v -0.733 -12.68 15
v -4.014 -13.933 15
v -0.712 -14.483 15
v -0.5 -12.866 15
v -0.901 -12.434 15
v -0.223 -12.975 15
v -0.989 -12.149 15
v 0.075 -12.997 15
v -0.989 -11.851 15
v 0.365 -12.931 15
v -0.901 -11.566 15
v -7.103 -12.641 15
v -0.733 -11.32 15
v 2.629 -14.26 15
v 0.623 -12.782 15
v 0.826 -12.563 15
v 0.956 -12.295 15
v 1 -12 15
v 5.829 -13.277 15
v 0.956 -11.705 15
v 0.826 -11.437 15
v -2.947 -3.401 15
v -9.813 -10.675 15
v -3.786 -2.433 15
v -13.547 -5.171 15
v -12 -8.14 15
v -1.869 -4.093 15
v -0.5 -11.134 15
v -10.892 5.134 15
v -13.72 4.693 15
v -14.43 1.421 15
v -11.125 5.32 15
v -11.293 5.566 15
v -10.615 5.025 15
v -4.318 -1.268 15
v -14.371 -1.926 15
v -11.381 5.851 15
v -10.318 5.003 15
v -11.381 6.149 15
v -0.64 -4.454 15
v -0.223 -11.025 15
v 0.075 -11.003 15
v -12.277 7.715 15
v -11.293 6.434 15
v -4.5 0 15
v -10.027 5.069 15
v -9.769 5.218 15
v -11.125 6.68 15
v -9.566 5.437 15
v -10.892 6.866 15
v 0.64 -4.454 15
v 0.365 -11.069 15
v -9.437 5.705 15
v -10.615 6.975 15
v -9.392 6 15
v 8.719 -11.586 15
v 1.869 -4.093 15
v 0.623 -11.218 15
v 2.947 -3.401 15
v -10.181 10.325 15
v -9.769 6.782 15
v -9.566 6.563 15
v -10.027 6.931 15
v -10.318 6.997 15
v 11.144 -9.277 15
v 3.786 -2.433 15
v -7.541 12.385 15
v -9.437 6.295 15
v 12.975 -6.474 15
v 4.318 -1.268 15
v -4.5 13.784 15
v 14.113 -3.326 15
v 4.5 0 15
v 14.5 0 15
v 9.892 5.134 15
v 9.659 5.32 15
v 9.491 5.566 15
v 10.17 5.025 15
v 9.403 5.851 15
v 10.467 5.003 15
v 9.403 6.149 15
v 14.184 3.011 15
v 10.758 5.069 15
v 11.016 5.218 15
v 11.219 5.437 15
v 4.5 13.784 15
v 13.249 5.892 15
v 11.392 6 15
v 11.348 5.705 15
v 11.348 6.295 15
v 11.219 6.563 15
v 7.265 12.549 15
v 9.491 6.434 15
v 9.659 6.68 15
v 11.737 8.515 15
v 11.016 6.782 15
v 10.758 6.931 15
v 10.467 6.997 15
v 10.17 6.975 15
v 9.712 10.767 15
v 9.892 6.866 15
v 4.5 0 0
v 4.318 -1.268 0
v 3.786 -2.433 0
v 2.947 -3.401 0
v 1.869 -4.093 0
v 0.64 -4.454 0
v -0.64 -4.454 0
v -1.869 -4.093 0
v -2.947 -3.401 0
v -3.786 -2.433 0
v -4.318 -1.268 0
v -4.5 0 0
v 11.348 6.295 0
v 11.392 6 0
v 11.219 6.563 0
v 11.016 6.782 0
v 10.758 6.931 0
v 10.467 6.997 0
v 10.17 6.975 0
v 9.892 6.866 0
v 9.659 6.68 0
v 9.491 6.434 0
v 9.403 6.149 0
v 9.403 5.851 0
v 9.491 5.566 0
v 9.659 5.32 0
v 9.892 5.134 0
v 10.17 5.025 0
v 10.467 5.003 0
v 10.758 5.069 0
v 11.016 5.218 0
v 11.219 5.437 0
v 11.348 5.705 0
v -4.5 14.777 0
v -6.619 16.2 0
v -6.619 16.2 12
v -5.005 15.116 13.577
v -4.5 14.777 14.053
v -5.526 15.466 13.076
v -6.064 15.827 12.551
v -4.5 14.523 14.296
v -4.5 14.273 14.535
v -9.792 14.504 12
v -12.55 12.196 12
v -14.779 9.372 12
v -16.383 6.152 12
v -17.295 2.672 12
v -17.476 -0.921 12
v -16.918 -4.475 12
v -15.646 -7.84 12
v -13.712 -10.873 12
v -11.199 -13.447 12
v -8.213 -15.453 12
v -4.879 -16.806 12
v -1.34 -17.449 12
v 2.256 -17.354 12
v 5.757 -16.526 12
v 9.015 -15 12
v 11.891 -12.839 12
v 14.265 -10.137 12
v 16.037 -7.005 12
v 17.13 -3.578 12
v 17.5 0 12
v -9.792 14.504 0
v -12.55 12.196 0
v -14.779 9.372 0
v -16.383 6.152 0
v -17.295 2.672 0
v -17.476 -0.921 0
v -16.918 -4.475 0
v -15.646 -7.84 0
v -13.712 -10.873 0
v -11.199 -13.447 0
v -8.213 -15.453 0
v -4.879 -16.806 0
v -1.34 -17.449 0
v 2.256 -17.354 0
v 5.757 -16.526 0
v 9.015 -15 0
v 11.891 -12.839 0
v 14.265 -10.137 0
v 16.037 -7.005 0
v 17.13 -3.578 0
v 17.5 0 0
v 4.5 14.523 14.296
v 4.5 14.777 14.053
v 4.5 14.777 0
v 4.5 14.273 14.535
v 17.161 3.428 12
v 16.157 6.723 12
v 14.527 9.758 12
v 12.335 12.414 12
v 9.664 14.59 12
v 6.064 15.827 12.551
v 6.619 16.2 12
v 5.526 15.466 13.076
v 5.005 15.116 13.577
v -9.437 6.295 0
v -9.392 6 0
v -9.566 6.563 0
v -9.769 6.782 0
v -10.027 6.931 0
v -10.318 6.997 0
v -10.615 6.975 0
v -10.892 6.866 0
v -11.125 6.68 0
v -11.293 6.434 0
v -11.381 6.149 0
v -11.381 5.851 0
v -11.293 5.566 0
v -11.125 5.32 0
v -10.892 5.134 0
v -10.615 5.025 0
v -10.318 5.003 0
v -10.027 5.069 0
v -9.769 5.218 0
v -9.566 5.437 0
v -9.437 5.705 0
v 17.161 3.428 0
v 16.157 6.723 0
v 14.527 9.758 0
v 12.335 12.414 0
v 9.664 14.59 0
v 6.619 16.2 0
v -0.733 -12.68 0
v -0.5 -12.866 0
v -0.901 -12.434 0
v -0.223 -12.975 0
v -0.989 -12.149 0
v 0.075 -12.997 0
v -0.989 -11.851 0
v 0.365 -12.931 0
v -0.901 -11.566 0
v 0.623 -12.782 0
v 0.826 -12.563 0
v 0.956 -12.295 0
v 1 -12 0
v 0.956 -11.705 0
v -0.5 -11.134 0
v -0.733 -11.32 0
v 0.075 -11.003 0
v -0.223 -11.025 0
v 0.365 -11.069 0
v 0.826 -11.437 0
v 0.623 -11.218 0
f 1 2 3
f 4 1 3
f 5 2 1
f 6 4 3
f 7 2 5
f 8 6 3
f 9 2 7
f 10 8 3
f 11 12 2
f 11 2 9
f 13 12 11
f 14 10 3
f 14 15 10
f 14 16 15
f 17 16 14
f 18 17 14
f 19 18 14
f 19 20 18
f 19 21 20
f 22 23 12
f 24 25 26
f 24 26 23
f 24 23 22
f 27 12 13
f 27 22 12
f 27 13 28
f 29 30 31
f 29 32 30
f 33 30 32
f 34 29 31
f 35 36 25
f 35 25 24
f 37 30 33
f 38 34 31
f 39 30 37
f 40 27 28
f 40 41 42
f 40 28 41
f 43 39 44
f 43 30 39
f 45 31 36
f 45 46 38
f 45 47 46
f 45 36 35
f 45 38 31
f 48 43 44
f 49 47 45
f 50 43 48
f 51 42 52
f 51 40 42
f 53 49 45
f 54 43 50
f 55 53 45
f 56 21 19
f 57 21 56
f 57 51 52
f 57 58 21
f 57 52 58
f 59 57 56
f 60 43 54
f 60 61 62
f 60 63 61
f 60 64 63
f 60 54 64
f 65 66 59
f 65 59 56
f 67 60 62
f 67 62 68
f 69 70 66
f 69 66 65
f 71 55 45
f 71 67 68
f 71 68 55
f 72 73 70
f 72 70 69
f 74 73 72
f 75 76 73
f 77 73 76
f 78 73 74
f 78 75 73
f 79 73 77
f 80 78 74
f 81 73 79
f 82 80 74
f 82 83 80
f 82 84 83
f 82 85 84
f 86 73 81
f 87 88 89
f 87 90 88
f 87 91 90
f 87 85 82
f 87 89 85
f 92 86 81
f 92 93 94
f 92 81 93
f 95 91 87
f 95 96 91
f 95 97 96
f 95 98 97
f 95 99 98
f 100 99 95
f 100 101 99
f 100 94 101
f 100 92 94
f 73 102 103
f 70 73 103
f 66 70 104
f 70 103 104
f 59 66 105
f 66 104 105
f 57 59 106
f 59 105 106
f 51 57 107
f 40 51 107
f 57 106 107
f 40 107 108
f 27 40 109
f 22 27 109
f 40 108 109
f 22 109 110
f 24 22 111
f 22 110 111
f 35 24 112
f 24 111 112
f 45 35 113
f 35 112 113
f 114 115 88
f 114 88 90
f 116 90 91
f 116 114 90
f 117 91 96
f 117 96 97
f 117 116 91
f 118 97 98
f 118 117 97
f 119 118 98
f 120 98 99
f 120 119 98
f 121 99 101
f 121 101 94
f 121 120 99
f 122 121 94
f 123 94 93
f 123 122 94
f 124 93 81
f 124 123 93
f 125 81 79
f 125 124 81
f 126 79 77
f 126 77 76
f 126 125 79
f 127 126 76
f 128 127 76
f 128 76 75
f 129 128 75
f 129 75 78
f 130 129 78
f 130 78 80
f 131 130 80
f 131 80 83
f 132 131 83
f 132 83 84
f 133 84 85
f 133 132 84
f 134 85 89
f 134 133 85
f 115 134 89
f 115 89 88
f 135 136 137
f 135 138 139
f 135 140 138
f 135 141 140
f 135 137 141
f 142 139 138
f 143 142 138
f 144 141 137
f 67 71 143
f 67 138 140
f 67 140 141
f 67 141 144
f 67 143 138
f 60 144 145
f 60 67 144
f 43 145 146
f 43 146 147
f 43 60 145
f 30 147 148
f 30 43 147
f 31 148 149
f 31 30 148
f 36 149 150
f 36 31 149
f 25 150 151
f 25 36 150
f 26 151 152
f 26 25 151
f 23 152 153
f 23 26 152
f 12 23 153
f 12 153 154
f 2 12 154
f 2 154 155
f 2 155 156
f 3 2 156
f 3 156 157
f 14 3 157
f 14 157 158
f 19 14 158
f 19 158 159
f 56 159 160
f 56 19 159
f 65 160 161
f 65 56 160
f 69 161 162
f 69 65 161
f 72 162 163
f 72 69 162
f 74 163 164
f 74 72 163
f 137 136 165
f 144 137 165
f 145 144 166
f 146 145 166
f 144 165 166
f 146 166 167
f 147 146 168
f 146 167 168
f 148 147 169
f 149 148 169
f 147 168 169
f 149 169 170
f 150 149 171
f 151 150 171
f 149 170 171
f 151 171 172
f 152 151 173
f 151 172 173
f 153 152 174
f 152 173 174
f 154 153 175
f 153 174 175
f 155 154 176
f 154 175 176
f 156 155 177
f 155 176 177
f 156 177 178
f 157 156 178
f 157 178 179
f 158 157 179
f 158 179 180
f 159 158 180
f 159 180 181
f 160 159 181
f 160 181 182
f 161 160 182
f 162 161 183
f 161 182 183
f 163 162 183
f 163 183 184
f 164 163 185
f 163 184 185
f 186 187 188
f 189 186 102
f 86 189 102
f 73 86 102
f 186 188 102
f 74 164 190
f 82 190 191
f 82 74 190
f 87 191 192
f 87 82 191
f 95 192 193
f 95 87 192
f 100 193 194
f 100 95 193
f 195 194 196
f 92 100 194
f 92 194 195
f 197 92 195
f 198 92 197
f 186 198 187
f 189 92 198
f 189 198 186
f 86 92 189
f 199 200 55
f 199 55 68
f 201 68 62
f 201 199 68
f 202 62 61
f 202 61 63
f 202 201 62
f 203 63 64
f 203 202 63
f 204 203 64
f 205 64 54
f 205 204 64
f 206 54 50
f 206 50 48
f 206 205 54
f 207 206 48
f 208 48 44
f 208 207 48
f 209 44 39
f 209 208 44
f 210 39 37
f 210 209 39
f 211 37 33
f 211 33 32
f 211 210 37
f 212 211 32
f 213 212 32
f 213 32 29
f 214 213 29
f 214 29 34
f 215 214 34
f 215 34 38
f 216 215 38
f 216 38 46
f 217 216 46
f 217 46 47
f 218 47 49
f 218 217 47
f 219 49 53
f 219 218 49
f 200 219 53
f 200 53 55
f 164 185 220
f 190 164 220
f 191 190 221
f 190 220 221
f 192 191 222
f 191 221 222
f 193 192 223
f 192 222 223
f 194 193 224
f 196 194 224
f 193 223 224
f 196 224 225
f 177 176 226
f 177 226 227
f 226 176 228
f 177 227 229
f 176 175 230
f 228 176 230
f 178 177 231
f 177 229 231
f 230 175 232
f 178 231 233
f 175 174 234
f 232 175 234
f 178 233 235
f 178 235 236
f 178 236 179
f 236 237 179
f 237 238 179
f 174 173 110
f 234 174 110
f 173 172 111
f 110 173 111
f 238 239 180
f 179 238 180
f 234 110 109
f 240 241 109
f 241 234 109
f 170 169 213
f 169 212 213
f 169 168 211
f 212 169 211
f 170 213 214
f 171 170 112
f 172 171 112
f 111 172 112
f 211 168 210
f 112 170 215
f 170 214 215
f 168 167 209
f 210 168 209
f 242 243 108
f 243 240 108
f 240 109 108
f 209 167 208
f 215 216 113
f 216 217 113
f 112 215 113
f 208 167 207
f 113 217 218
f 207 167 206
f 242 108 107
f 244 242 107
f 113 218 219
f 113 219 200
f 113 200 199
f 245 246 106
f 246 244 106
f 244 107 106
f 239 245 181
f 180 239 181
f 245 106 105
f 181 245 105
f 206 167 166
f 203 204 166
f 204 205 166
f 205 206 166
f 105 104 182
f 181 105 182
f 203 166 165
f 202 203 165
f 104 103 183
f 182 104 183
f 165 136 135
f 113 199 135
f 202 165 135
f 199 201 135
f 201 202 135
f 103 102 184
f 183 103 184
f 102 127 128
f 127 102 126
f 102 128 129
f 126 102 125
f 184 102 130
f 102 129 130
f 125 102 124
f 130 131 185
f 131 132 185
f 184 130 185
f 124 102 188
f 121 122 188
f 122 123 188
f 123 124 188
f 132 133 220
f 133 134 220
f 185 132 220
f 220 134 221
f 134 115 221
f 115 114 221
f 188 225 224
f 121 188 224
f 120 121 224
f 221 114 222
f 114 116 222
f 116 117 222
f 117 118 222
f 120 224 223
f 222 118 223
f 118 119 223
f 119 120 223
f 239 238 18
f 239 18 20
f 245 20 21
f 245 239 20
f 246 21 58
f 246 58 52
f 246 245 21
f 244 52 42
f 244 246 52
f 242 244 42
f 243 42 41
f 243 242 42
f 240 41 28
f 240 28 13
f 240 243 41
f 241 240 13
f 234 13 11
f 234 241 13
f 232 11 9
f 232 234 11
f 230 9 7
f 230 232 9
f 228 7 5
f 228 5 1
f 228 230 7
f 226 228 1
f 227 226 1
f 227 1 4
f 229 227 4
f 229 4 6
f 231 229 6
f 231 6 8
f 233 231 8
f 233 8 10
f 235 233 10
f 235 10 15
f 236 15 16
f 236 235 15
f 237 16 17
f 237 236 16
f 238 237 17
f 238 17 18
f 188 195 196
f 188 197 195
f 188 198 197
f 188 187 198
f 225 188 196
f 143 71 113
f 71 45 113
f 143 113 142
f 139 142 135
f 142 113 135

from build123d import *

# Parameters (mm, degrees)
F0_R        = 1
F1_DEPTH    = 15
F2_SIZE     = 3
F3_T1_DEPTH = 23.4240423609


# Not quite as in the source:
# - a fillet or chamfer that OpenCascade refuses, or shapes differently, is made with other operations: its cross-section is extruded or revolved along the edge and cut away or added


with BuildPart() as f1:
    # F0 (on Top) → F1 (new body)
    with BuildSketch(Plane.XY):
        with BuildLine():
            ThreePointArc((-4.5, 16.9115345253), (-10.6653645039, -13.8744369255), (17.5, 0))
            ThreePointArc((17.5, 0), (13.8744369255, 10.6653645039), (4.5, 16.9115345253))
            Line((4.5, 16.9115345253), (4.5, 0))
            ThreePointArc((4.5, 0), (0, -4.5), (-4.5, 0))
            Line((-4.5, 0), (-4.5, 16.9115345253))
        make_face()
        with Locations((0, -12)):
            Circle(F0_R, mode=Mode.SUBTRACT)
        with Locations((-10.3923048454, 6)):
            Circle(F0_R, mode=Mode.SUBTRACT)
        with Locations((10.3923048454, 6)):
            Circle(F0_R, mode=Mode.SUBTRACT)
    extrude(amount=F1_DEPTH)

    # F2
    f2_edges = [f1.edges().sort_by_distance(p)[0] for p in [
        (-10.665365, -13.874437, 15),
        (13.874437, 10.665365, 15),
    ]]
    chamfer(f2_edges, length=F2_SIZE)

    # F3: chamfer of 2 on 2 edges, made by hand

    # F3_s2 → F3_t1 (cut)
    with BuildSketch(Plane.XY.offset(-5.7120211805)):
        with BuildLine():
            Line((-6.685306539, 16.244612427), (-4.4335898165, 14.7321955637))
            Line((-4.4335898165, 14.7321955637), (-4.3935898165, 14.7321955637))
            ThreePointArc((-4.3935898165, 14.7321955637), (-4.46, 15.8218650445), (-4.46, 16.9115345253))
            Line((-4.46, 16.9115345253), (-4.5102857143, 16.9501894613))
            ThreePointArc((-4.5102857143, 16.9501894613), (-5.6067154961, 16.6197575598), (-6.700435445, 16.2816410133))
            Line((-6.700435445, 16.2816410133), (-6.685306539, 16.244612427))
        make_face()
        with BuildLine():
            Line((4.4335898165, 14.7321955637), (6.685306539, 16.244612427))
            Line((6.685306539, 16.244612427), (6.700435445, 16.2816410133))
            ThreePointArc((6.700435445, 16.2816410133), (5.6067154961, 16.6197575598), (4.5102857143, 16.9501894613))
            Line((4.5102857143, 16.9501894613), (4.46, 16.9115345253))
            ThreePointArc((4.46, 16.9115345253), (4.46, 15.8218650445), (4.3935898165, 14.7321955637))
            Line((4.3935898165, 14.7321955637), (4.4335898165, 14.7321955637))
        make_face()
    extrude(amount=F3_T1_DEPTH, mode=Mode.SUBTRACT)


solid = f1.part
